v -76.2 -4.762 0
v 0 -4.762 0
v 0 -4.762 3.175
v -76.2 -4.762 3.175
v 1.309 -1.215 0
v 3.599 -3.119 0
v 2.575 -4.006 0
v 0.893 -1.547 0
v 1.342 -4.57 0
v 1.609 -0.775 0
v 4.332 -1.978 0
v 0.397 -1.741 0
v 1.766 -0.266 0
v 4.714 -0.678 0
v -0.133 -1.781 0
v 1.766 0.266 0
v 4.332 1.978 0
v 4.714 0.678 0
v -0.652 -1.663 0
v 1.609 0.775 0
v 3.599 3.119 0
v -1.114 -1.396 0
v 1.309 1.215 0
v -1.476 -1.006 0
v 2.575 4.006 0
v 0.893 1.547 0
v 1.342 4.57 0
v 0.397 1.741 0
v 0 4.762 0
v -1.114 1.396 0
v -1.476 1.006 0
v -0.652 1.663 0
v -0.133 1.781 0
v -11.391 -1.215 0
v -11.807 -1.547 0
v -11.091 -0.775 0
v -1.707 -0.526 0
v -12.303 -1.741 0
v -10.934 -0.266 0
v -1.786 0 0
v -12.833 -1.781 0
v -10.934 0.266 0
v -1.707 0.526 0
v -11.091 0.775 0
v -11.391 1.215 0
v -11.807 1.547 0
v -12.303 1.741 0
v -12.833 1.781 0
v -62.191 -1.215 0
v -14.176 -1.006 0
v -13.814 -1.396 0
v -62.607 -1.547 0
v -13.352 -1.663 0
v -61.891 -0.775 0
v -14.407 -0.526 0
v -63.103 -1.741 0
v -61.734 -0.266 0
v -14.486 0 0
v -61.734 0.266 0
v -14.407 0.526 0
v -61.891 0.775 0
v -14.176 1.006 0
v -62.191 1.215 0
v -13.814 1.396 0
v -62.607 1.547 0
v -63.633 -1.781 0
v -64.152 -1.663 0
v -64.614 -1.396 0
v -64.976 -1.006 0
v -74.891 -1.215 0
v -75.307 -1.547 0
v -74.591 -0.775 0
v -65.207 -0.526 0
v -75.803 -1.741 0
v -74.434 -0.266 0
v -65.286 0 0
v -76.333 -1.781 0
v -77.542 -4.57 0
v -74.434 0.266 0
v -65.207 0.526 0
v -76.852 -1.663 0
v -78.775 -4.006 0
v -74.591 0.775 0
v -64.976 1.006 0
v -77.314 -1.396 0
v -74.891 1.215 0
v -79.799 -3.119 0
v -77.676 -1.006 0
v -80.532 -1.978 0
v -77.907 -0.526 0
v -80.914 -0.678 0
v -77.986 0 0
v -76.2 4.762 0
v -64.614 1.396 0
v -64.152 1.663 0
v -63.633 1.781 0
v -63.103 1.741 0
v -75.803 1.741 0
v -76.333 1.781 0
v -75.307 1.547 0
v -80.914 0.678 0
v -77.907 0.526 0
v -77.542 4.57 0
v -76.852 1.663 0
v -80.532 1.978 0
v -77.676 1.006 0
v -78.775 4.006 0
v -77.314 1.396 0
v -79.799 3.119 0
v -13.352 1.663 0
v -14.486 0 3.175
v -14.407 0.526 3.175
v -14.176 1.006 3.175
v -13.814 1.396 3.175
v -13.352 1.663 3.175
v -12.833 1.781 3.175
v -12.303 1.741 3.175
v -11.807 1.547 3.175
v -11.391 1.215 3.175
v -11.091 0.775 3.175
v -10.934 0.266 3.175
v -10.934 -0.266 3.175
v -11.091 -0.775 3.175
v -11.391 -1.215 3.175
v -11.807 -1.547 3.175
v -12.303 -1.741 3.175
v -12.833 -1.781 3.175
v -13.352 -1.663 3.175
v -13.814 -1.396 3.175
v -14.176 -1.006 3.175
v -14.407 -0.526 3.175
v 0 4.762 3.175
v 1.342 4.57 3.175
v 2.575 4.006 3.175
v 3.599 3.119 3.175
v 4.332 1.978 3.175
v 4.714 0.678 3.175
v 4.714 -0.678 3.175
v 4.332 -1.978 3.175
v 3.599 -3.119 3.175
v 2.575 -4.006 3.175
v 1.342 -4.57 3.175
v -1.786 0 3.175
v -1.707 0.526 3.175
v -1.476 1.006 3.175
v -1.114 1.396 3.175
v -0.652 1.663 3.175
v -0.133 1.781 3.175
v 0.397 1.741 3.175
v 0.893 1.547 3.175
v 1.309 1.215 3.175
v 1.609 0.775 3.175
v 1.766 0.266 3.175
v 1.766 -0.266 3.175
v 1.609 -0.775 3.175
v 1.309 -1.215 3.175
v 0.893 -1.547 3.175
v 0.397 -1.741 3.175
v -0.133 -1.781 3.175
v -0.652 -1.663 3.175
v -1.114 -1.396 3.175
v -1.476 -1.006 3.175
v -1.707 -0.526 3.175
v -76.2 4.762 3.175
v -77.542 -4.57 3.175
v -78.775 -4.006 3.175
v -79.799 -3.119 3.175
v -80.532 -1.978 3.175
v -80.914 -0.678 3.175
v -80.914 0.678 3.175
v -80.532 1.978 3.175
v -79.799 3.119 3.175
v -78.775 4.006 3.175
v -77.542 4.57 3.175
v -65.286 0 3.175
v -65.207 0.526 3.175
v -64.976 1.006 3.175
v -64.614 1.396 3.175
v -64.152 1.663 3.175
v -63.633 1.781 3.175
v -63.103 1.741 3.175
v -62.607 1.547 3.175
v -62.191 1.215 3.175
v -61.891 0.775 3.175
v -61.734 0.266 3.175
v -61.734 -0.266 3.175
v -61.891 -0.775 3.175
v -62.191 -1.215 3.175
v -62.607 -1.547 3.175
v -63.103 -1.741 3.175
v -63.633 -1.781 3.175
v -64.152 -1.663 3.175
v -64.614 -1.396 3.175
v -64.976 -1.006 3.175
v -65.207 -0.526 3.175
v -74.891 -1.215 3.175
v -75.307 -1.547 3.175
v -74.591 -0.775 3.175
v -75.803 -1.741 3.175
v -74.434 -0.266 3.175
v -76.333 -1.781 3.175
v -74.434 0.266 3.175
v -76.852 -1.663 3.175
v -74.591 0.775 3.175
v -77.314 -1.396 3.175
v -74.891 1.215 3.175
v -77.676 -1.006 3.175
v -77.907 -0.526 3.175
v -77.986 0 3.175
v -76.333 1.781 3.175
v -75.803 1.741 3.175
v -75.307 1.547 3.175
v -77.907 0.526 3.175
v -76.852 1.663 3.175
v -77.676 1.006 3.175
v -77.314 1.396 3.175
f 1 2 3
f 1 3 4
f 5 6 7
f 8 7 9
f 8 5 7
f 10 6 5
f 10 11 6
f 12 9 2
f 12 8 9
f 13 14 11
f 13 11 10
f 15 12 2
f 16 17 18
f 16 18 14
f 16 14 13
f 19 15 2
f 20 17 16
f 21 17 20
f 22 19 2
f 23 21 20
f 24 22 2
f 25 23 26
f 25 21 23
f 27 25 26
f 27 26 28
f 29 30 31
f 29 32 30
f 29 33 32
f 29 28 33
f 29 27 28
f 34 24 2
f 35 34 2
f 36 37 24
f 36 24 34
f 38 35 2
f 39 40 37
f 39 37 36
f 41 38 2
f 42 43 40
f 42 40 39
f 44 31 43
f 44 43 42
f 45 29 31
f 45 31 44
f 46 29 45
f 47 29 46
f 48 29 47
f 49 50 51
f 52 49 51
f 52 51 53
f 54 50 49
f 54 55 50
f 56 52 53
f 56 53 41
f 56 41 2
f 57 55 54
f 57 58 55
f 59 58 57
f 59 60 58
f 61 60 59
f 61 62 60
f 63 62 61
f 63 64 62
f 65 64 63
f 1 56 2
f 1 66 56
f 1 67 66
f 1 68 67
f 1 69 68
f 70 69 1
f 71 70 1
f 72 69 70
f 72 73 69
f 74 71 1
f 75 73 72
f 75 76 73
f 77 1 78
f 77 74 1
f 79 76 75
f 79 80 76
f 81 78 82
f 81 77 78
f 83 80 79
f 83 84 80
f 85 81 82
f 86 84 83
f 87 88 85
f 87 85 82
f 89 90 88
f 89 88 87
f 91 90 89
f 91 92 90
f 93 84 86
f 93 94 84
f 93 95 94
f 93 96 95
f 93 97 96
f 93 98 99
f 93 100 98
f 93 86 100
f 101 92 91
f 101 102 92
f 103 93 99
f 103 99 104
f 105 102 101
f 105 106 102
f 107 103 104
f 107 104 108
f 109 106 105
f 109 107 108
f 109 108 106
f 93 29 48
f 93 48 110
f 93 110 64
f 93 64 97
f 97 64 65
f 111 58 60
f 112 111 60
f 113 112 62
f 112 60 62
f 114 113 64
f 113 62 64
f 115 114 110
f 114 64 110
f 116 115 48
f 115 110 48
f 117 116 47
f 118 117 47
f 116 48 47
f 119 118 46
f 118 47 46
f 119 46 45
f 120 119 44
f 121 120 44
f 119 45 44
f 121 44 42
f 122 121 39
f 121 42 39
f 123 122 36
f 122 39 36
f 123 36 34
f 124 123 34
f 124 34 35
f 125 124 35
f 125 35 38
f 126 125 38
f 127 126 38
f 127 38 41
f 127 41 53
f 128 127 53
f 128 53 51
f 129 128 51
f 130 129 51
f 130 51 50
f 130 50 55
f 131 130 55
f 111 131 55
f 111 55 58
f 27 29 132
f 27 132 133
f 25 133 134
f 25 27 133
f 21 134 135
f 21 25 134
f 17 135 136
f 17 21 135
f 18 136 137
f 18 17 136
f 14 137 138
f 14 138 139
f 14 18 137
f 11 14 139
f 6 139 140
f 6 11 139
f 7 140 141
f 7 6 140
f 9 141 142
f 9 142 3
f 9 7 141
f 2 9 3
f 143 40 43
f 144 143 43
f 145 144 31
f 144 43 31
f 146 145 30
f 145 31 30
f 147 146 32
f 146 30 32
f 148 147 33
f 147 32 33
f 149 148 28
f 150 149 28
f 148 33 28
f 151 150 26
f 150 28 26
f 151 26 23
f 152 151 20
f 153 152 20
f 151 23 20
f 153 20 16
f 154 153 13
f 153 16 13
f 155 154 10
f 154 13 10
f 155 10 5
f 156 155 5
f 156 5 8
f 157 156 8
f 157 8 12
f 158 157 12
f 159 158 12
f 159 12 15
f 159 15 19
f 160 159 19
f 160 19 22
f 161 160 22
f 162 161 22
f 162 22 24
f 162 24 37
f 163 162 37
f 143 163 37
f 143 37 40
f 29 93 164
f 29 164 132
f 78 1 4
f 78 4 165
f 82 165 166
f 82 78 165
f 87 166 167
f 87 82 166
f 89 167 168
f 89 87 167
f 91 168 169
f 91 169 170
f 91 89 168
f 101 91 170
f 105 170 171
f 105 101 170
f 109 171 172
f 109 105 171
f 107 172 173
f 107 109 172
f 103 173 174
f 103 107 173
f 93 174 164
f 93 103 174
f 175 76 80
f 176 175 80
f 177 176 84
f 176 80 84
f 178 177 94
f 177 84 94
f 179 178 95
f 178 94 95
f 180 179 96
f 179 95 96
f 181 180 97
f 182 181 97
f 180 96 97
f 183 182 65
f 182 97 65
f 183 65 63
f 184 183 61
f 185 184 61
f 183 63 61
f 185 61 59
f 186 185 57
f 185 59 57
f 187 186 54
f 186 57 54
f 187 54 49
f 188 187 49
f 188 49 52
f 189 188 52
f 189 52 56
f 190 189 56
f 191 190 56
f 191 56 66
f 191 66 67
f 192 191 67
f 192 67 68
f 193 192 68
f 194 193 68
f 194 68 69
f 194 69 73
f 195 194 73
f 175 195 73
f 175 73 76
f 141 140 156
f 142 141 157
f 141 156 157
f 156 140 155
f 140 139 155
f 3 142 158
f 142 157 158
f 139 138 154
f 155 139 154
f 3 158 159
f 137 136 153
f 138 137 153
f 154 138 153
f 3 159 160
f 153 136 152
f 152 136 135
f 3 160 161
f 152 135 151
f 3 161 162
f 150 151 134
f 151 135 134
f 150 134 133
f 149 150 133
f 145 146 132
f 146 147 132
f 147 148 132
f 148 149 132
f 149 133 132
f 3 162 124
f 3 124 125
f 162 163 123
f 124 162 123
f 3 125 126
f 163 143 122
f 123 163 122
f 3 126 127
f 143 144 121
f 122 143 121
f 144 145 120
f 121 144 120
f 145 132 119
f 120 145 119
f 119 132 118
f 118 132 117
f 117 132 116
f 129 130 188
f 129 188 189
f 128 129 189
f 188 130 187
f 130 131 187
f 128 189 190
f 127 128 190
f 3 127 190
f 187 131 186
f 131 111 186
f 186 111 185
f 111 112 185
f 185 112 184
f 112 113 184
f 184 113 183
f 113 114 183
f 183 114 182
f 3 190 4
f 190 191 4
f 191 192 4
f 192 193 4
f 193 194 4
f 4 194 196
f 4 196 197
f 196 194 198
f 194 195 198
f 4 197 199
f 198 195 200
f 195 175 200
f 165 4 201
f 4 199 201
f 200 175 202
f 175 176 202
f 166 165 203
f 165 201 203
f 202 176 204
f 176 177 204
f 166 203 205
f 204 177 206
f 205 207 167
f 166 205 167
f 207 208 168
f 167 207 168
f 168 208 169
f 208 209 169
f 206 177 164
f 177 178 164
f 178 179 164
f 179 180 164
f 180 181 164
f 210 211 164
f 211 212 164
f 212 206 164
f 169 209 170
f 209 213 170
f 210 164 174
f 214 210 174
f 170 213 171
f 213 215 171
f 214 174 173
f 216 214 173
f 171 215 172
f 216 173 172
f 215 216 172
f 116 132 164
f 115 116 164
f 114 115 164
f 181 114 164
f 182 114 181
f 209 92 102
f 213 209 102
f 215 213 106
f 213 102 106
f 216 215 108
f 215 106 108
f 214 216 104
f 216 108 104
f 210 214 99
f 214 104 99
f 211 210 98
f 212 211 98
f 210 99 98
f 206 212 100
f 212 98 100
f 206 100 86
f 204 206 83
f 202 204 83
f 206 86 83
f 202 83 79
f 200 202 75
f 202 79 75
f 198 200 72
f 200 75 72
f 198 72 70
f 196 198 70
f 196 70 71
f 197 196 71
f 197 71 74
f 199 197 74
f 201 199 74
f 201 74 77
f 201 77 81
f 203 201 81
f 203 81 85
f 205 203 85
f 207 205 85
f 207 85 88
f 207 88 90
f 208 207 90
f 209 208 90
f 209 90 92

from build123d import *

# Parameters (mm, degrees)
BOSS_EXTRUDE1_DEPTH             = 3.175
F_9_64_0_14063_DIAMETER_HOLE1_D = 3.572002
F_9_64_0_14063_DIAMETER_HOLE2_D = 3.572002


with BuildPart() as part:
    # Sketch1 → Boss-Extrude1 (new body)
    with BuildSketch(Plane.XY):
        with BuildLine():
            Line((0, -4.7625), (-76.2, -4.7625))
            ThreePointArc((-76.2, -4.7625), (-80.9625, 0), (-76.2, 4.7625))
            Line((-76.2, 4.7625), (0, 4.7625))
            ThreePointArc((0, 4.7625), (4.7625, 0), (0, -4.7625))
        make_face()
    extrude(amount=BOSS_EXTRUDE1_DEPTH)

    # 9/64 (0.14063) Diameter Hole1 (through all)
    with Locations(Plane.XY.offset(3.175)):
        with Locations((0, 0), (-76.2, 0)):
            Hole(F_9_64_0_14063_DIAMETER_HOLE1_D / 2)

    # 9/64 (0.14063) Diameter Hole2 (through all)
    with Locations(Plane.XY.offset(3.175)):
        with Locations((-12.7, 0), (-63.5, 0)):
            Hole(F_9_64_0_14063_DIAMETER_HOLE2_D / 2)


solid = part.part
